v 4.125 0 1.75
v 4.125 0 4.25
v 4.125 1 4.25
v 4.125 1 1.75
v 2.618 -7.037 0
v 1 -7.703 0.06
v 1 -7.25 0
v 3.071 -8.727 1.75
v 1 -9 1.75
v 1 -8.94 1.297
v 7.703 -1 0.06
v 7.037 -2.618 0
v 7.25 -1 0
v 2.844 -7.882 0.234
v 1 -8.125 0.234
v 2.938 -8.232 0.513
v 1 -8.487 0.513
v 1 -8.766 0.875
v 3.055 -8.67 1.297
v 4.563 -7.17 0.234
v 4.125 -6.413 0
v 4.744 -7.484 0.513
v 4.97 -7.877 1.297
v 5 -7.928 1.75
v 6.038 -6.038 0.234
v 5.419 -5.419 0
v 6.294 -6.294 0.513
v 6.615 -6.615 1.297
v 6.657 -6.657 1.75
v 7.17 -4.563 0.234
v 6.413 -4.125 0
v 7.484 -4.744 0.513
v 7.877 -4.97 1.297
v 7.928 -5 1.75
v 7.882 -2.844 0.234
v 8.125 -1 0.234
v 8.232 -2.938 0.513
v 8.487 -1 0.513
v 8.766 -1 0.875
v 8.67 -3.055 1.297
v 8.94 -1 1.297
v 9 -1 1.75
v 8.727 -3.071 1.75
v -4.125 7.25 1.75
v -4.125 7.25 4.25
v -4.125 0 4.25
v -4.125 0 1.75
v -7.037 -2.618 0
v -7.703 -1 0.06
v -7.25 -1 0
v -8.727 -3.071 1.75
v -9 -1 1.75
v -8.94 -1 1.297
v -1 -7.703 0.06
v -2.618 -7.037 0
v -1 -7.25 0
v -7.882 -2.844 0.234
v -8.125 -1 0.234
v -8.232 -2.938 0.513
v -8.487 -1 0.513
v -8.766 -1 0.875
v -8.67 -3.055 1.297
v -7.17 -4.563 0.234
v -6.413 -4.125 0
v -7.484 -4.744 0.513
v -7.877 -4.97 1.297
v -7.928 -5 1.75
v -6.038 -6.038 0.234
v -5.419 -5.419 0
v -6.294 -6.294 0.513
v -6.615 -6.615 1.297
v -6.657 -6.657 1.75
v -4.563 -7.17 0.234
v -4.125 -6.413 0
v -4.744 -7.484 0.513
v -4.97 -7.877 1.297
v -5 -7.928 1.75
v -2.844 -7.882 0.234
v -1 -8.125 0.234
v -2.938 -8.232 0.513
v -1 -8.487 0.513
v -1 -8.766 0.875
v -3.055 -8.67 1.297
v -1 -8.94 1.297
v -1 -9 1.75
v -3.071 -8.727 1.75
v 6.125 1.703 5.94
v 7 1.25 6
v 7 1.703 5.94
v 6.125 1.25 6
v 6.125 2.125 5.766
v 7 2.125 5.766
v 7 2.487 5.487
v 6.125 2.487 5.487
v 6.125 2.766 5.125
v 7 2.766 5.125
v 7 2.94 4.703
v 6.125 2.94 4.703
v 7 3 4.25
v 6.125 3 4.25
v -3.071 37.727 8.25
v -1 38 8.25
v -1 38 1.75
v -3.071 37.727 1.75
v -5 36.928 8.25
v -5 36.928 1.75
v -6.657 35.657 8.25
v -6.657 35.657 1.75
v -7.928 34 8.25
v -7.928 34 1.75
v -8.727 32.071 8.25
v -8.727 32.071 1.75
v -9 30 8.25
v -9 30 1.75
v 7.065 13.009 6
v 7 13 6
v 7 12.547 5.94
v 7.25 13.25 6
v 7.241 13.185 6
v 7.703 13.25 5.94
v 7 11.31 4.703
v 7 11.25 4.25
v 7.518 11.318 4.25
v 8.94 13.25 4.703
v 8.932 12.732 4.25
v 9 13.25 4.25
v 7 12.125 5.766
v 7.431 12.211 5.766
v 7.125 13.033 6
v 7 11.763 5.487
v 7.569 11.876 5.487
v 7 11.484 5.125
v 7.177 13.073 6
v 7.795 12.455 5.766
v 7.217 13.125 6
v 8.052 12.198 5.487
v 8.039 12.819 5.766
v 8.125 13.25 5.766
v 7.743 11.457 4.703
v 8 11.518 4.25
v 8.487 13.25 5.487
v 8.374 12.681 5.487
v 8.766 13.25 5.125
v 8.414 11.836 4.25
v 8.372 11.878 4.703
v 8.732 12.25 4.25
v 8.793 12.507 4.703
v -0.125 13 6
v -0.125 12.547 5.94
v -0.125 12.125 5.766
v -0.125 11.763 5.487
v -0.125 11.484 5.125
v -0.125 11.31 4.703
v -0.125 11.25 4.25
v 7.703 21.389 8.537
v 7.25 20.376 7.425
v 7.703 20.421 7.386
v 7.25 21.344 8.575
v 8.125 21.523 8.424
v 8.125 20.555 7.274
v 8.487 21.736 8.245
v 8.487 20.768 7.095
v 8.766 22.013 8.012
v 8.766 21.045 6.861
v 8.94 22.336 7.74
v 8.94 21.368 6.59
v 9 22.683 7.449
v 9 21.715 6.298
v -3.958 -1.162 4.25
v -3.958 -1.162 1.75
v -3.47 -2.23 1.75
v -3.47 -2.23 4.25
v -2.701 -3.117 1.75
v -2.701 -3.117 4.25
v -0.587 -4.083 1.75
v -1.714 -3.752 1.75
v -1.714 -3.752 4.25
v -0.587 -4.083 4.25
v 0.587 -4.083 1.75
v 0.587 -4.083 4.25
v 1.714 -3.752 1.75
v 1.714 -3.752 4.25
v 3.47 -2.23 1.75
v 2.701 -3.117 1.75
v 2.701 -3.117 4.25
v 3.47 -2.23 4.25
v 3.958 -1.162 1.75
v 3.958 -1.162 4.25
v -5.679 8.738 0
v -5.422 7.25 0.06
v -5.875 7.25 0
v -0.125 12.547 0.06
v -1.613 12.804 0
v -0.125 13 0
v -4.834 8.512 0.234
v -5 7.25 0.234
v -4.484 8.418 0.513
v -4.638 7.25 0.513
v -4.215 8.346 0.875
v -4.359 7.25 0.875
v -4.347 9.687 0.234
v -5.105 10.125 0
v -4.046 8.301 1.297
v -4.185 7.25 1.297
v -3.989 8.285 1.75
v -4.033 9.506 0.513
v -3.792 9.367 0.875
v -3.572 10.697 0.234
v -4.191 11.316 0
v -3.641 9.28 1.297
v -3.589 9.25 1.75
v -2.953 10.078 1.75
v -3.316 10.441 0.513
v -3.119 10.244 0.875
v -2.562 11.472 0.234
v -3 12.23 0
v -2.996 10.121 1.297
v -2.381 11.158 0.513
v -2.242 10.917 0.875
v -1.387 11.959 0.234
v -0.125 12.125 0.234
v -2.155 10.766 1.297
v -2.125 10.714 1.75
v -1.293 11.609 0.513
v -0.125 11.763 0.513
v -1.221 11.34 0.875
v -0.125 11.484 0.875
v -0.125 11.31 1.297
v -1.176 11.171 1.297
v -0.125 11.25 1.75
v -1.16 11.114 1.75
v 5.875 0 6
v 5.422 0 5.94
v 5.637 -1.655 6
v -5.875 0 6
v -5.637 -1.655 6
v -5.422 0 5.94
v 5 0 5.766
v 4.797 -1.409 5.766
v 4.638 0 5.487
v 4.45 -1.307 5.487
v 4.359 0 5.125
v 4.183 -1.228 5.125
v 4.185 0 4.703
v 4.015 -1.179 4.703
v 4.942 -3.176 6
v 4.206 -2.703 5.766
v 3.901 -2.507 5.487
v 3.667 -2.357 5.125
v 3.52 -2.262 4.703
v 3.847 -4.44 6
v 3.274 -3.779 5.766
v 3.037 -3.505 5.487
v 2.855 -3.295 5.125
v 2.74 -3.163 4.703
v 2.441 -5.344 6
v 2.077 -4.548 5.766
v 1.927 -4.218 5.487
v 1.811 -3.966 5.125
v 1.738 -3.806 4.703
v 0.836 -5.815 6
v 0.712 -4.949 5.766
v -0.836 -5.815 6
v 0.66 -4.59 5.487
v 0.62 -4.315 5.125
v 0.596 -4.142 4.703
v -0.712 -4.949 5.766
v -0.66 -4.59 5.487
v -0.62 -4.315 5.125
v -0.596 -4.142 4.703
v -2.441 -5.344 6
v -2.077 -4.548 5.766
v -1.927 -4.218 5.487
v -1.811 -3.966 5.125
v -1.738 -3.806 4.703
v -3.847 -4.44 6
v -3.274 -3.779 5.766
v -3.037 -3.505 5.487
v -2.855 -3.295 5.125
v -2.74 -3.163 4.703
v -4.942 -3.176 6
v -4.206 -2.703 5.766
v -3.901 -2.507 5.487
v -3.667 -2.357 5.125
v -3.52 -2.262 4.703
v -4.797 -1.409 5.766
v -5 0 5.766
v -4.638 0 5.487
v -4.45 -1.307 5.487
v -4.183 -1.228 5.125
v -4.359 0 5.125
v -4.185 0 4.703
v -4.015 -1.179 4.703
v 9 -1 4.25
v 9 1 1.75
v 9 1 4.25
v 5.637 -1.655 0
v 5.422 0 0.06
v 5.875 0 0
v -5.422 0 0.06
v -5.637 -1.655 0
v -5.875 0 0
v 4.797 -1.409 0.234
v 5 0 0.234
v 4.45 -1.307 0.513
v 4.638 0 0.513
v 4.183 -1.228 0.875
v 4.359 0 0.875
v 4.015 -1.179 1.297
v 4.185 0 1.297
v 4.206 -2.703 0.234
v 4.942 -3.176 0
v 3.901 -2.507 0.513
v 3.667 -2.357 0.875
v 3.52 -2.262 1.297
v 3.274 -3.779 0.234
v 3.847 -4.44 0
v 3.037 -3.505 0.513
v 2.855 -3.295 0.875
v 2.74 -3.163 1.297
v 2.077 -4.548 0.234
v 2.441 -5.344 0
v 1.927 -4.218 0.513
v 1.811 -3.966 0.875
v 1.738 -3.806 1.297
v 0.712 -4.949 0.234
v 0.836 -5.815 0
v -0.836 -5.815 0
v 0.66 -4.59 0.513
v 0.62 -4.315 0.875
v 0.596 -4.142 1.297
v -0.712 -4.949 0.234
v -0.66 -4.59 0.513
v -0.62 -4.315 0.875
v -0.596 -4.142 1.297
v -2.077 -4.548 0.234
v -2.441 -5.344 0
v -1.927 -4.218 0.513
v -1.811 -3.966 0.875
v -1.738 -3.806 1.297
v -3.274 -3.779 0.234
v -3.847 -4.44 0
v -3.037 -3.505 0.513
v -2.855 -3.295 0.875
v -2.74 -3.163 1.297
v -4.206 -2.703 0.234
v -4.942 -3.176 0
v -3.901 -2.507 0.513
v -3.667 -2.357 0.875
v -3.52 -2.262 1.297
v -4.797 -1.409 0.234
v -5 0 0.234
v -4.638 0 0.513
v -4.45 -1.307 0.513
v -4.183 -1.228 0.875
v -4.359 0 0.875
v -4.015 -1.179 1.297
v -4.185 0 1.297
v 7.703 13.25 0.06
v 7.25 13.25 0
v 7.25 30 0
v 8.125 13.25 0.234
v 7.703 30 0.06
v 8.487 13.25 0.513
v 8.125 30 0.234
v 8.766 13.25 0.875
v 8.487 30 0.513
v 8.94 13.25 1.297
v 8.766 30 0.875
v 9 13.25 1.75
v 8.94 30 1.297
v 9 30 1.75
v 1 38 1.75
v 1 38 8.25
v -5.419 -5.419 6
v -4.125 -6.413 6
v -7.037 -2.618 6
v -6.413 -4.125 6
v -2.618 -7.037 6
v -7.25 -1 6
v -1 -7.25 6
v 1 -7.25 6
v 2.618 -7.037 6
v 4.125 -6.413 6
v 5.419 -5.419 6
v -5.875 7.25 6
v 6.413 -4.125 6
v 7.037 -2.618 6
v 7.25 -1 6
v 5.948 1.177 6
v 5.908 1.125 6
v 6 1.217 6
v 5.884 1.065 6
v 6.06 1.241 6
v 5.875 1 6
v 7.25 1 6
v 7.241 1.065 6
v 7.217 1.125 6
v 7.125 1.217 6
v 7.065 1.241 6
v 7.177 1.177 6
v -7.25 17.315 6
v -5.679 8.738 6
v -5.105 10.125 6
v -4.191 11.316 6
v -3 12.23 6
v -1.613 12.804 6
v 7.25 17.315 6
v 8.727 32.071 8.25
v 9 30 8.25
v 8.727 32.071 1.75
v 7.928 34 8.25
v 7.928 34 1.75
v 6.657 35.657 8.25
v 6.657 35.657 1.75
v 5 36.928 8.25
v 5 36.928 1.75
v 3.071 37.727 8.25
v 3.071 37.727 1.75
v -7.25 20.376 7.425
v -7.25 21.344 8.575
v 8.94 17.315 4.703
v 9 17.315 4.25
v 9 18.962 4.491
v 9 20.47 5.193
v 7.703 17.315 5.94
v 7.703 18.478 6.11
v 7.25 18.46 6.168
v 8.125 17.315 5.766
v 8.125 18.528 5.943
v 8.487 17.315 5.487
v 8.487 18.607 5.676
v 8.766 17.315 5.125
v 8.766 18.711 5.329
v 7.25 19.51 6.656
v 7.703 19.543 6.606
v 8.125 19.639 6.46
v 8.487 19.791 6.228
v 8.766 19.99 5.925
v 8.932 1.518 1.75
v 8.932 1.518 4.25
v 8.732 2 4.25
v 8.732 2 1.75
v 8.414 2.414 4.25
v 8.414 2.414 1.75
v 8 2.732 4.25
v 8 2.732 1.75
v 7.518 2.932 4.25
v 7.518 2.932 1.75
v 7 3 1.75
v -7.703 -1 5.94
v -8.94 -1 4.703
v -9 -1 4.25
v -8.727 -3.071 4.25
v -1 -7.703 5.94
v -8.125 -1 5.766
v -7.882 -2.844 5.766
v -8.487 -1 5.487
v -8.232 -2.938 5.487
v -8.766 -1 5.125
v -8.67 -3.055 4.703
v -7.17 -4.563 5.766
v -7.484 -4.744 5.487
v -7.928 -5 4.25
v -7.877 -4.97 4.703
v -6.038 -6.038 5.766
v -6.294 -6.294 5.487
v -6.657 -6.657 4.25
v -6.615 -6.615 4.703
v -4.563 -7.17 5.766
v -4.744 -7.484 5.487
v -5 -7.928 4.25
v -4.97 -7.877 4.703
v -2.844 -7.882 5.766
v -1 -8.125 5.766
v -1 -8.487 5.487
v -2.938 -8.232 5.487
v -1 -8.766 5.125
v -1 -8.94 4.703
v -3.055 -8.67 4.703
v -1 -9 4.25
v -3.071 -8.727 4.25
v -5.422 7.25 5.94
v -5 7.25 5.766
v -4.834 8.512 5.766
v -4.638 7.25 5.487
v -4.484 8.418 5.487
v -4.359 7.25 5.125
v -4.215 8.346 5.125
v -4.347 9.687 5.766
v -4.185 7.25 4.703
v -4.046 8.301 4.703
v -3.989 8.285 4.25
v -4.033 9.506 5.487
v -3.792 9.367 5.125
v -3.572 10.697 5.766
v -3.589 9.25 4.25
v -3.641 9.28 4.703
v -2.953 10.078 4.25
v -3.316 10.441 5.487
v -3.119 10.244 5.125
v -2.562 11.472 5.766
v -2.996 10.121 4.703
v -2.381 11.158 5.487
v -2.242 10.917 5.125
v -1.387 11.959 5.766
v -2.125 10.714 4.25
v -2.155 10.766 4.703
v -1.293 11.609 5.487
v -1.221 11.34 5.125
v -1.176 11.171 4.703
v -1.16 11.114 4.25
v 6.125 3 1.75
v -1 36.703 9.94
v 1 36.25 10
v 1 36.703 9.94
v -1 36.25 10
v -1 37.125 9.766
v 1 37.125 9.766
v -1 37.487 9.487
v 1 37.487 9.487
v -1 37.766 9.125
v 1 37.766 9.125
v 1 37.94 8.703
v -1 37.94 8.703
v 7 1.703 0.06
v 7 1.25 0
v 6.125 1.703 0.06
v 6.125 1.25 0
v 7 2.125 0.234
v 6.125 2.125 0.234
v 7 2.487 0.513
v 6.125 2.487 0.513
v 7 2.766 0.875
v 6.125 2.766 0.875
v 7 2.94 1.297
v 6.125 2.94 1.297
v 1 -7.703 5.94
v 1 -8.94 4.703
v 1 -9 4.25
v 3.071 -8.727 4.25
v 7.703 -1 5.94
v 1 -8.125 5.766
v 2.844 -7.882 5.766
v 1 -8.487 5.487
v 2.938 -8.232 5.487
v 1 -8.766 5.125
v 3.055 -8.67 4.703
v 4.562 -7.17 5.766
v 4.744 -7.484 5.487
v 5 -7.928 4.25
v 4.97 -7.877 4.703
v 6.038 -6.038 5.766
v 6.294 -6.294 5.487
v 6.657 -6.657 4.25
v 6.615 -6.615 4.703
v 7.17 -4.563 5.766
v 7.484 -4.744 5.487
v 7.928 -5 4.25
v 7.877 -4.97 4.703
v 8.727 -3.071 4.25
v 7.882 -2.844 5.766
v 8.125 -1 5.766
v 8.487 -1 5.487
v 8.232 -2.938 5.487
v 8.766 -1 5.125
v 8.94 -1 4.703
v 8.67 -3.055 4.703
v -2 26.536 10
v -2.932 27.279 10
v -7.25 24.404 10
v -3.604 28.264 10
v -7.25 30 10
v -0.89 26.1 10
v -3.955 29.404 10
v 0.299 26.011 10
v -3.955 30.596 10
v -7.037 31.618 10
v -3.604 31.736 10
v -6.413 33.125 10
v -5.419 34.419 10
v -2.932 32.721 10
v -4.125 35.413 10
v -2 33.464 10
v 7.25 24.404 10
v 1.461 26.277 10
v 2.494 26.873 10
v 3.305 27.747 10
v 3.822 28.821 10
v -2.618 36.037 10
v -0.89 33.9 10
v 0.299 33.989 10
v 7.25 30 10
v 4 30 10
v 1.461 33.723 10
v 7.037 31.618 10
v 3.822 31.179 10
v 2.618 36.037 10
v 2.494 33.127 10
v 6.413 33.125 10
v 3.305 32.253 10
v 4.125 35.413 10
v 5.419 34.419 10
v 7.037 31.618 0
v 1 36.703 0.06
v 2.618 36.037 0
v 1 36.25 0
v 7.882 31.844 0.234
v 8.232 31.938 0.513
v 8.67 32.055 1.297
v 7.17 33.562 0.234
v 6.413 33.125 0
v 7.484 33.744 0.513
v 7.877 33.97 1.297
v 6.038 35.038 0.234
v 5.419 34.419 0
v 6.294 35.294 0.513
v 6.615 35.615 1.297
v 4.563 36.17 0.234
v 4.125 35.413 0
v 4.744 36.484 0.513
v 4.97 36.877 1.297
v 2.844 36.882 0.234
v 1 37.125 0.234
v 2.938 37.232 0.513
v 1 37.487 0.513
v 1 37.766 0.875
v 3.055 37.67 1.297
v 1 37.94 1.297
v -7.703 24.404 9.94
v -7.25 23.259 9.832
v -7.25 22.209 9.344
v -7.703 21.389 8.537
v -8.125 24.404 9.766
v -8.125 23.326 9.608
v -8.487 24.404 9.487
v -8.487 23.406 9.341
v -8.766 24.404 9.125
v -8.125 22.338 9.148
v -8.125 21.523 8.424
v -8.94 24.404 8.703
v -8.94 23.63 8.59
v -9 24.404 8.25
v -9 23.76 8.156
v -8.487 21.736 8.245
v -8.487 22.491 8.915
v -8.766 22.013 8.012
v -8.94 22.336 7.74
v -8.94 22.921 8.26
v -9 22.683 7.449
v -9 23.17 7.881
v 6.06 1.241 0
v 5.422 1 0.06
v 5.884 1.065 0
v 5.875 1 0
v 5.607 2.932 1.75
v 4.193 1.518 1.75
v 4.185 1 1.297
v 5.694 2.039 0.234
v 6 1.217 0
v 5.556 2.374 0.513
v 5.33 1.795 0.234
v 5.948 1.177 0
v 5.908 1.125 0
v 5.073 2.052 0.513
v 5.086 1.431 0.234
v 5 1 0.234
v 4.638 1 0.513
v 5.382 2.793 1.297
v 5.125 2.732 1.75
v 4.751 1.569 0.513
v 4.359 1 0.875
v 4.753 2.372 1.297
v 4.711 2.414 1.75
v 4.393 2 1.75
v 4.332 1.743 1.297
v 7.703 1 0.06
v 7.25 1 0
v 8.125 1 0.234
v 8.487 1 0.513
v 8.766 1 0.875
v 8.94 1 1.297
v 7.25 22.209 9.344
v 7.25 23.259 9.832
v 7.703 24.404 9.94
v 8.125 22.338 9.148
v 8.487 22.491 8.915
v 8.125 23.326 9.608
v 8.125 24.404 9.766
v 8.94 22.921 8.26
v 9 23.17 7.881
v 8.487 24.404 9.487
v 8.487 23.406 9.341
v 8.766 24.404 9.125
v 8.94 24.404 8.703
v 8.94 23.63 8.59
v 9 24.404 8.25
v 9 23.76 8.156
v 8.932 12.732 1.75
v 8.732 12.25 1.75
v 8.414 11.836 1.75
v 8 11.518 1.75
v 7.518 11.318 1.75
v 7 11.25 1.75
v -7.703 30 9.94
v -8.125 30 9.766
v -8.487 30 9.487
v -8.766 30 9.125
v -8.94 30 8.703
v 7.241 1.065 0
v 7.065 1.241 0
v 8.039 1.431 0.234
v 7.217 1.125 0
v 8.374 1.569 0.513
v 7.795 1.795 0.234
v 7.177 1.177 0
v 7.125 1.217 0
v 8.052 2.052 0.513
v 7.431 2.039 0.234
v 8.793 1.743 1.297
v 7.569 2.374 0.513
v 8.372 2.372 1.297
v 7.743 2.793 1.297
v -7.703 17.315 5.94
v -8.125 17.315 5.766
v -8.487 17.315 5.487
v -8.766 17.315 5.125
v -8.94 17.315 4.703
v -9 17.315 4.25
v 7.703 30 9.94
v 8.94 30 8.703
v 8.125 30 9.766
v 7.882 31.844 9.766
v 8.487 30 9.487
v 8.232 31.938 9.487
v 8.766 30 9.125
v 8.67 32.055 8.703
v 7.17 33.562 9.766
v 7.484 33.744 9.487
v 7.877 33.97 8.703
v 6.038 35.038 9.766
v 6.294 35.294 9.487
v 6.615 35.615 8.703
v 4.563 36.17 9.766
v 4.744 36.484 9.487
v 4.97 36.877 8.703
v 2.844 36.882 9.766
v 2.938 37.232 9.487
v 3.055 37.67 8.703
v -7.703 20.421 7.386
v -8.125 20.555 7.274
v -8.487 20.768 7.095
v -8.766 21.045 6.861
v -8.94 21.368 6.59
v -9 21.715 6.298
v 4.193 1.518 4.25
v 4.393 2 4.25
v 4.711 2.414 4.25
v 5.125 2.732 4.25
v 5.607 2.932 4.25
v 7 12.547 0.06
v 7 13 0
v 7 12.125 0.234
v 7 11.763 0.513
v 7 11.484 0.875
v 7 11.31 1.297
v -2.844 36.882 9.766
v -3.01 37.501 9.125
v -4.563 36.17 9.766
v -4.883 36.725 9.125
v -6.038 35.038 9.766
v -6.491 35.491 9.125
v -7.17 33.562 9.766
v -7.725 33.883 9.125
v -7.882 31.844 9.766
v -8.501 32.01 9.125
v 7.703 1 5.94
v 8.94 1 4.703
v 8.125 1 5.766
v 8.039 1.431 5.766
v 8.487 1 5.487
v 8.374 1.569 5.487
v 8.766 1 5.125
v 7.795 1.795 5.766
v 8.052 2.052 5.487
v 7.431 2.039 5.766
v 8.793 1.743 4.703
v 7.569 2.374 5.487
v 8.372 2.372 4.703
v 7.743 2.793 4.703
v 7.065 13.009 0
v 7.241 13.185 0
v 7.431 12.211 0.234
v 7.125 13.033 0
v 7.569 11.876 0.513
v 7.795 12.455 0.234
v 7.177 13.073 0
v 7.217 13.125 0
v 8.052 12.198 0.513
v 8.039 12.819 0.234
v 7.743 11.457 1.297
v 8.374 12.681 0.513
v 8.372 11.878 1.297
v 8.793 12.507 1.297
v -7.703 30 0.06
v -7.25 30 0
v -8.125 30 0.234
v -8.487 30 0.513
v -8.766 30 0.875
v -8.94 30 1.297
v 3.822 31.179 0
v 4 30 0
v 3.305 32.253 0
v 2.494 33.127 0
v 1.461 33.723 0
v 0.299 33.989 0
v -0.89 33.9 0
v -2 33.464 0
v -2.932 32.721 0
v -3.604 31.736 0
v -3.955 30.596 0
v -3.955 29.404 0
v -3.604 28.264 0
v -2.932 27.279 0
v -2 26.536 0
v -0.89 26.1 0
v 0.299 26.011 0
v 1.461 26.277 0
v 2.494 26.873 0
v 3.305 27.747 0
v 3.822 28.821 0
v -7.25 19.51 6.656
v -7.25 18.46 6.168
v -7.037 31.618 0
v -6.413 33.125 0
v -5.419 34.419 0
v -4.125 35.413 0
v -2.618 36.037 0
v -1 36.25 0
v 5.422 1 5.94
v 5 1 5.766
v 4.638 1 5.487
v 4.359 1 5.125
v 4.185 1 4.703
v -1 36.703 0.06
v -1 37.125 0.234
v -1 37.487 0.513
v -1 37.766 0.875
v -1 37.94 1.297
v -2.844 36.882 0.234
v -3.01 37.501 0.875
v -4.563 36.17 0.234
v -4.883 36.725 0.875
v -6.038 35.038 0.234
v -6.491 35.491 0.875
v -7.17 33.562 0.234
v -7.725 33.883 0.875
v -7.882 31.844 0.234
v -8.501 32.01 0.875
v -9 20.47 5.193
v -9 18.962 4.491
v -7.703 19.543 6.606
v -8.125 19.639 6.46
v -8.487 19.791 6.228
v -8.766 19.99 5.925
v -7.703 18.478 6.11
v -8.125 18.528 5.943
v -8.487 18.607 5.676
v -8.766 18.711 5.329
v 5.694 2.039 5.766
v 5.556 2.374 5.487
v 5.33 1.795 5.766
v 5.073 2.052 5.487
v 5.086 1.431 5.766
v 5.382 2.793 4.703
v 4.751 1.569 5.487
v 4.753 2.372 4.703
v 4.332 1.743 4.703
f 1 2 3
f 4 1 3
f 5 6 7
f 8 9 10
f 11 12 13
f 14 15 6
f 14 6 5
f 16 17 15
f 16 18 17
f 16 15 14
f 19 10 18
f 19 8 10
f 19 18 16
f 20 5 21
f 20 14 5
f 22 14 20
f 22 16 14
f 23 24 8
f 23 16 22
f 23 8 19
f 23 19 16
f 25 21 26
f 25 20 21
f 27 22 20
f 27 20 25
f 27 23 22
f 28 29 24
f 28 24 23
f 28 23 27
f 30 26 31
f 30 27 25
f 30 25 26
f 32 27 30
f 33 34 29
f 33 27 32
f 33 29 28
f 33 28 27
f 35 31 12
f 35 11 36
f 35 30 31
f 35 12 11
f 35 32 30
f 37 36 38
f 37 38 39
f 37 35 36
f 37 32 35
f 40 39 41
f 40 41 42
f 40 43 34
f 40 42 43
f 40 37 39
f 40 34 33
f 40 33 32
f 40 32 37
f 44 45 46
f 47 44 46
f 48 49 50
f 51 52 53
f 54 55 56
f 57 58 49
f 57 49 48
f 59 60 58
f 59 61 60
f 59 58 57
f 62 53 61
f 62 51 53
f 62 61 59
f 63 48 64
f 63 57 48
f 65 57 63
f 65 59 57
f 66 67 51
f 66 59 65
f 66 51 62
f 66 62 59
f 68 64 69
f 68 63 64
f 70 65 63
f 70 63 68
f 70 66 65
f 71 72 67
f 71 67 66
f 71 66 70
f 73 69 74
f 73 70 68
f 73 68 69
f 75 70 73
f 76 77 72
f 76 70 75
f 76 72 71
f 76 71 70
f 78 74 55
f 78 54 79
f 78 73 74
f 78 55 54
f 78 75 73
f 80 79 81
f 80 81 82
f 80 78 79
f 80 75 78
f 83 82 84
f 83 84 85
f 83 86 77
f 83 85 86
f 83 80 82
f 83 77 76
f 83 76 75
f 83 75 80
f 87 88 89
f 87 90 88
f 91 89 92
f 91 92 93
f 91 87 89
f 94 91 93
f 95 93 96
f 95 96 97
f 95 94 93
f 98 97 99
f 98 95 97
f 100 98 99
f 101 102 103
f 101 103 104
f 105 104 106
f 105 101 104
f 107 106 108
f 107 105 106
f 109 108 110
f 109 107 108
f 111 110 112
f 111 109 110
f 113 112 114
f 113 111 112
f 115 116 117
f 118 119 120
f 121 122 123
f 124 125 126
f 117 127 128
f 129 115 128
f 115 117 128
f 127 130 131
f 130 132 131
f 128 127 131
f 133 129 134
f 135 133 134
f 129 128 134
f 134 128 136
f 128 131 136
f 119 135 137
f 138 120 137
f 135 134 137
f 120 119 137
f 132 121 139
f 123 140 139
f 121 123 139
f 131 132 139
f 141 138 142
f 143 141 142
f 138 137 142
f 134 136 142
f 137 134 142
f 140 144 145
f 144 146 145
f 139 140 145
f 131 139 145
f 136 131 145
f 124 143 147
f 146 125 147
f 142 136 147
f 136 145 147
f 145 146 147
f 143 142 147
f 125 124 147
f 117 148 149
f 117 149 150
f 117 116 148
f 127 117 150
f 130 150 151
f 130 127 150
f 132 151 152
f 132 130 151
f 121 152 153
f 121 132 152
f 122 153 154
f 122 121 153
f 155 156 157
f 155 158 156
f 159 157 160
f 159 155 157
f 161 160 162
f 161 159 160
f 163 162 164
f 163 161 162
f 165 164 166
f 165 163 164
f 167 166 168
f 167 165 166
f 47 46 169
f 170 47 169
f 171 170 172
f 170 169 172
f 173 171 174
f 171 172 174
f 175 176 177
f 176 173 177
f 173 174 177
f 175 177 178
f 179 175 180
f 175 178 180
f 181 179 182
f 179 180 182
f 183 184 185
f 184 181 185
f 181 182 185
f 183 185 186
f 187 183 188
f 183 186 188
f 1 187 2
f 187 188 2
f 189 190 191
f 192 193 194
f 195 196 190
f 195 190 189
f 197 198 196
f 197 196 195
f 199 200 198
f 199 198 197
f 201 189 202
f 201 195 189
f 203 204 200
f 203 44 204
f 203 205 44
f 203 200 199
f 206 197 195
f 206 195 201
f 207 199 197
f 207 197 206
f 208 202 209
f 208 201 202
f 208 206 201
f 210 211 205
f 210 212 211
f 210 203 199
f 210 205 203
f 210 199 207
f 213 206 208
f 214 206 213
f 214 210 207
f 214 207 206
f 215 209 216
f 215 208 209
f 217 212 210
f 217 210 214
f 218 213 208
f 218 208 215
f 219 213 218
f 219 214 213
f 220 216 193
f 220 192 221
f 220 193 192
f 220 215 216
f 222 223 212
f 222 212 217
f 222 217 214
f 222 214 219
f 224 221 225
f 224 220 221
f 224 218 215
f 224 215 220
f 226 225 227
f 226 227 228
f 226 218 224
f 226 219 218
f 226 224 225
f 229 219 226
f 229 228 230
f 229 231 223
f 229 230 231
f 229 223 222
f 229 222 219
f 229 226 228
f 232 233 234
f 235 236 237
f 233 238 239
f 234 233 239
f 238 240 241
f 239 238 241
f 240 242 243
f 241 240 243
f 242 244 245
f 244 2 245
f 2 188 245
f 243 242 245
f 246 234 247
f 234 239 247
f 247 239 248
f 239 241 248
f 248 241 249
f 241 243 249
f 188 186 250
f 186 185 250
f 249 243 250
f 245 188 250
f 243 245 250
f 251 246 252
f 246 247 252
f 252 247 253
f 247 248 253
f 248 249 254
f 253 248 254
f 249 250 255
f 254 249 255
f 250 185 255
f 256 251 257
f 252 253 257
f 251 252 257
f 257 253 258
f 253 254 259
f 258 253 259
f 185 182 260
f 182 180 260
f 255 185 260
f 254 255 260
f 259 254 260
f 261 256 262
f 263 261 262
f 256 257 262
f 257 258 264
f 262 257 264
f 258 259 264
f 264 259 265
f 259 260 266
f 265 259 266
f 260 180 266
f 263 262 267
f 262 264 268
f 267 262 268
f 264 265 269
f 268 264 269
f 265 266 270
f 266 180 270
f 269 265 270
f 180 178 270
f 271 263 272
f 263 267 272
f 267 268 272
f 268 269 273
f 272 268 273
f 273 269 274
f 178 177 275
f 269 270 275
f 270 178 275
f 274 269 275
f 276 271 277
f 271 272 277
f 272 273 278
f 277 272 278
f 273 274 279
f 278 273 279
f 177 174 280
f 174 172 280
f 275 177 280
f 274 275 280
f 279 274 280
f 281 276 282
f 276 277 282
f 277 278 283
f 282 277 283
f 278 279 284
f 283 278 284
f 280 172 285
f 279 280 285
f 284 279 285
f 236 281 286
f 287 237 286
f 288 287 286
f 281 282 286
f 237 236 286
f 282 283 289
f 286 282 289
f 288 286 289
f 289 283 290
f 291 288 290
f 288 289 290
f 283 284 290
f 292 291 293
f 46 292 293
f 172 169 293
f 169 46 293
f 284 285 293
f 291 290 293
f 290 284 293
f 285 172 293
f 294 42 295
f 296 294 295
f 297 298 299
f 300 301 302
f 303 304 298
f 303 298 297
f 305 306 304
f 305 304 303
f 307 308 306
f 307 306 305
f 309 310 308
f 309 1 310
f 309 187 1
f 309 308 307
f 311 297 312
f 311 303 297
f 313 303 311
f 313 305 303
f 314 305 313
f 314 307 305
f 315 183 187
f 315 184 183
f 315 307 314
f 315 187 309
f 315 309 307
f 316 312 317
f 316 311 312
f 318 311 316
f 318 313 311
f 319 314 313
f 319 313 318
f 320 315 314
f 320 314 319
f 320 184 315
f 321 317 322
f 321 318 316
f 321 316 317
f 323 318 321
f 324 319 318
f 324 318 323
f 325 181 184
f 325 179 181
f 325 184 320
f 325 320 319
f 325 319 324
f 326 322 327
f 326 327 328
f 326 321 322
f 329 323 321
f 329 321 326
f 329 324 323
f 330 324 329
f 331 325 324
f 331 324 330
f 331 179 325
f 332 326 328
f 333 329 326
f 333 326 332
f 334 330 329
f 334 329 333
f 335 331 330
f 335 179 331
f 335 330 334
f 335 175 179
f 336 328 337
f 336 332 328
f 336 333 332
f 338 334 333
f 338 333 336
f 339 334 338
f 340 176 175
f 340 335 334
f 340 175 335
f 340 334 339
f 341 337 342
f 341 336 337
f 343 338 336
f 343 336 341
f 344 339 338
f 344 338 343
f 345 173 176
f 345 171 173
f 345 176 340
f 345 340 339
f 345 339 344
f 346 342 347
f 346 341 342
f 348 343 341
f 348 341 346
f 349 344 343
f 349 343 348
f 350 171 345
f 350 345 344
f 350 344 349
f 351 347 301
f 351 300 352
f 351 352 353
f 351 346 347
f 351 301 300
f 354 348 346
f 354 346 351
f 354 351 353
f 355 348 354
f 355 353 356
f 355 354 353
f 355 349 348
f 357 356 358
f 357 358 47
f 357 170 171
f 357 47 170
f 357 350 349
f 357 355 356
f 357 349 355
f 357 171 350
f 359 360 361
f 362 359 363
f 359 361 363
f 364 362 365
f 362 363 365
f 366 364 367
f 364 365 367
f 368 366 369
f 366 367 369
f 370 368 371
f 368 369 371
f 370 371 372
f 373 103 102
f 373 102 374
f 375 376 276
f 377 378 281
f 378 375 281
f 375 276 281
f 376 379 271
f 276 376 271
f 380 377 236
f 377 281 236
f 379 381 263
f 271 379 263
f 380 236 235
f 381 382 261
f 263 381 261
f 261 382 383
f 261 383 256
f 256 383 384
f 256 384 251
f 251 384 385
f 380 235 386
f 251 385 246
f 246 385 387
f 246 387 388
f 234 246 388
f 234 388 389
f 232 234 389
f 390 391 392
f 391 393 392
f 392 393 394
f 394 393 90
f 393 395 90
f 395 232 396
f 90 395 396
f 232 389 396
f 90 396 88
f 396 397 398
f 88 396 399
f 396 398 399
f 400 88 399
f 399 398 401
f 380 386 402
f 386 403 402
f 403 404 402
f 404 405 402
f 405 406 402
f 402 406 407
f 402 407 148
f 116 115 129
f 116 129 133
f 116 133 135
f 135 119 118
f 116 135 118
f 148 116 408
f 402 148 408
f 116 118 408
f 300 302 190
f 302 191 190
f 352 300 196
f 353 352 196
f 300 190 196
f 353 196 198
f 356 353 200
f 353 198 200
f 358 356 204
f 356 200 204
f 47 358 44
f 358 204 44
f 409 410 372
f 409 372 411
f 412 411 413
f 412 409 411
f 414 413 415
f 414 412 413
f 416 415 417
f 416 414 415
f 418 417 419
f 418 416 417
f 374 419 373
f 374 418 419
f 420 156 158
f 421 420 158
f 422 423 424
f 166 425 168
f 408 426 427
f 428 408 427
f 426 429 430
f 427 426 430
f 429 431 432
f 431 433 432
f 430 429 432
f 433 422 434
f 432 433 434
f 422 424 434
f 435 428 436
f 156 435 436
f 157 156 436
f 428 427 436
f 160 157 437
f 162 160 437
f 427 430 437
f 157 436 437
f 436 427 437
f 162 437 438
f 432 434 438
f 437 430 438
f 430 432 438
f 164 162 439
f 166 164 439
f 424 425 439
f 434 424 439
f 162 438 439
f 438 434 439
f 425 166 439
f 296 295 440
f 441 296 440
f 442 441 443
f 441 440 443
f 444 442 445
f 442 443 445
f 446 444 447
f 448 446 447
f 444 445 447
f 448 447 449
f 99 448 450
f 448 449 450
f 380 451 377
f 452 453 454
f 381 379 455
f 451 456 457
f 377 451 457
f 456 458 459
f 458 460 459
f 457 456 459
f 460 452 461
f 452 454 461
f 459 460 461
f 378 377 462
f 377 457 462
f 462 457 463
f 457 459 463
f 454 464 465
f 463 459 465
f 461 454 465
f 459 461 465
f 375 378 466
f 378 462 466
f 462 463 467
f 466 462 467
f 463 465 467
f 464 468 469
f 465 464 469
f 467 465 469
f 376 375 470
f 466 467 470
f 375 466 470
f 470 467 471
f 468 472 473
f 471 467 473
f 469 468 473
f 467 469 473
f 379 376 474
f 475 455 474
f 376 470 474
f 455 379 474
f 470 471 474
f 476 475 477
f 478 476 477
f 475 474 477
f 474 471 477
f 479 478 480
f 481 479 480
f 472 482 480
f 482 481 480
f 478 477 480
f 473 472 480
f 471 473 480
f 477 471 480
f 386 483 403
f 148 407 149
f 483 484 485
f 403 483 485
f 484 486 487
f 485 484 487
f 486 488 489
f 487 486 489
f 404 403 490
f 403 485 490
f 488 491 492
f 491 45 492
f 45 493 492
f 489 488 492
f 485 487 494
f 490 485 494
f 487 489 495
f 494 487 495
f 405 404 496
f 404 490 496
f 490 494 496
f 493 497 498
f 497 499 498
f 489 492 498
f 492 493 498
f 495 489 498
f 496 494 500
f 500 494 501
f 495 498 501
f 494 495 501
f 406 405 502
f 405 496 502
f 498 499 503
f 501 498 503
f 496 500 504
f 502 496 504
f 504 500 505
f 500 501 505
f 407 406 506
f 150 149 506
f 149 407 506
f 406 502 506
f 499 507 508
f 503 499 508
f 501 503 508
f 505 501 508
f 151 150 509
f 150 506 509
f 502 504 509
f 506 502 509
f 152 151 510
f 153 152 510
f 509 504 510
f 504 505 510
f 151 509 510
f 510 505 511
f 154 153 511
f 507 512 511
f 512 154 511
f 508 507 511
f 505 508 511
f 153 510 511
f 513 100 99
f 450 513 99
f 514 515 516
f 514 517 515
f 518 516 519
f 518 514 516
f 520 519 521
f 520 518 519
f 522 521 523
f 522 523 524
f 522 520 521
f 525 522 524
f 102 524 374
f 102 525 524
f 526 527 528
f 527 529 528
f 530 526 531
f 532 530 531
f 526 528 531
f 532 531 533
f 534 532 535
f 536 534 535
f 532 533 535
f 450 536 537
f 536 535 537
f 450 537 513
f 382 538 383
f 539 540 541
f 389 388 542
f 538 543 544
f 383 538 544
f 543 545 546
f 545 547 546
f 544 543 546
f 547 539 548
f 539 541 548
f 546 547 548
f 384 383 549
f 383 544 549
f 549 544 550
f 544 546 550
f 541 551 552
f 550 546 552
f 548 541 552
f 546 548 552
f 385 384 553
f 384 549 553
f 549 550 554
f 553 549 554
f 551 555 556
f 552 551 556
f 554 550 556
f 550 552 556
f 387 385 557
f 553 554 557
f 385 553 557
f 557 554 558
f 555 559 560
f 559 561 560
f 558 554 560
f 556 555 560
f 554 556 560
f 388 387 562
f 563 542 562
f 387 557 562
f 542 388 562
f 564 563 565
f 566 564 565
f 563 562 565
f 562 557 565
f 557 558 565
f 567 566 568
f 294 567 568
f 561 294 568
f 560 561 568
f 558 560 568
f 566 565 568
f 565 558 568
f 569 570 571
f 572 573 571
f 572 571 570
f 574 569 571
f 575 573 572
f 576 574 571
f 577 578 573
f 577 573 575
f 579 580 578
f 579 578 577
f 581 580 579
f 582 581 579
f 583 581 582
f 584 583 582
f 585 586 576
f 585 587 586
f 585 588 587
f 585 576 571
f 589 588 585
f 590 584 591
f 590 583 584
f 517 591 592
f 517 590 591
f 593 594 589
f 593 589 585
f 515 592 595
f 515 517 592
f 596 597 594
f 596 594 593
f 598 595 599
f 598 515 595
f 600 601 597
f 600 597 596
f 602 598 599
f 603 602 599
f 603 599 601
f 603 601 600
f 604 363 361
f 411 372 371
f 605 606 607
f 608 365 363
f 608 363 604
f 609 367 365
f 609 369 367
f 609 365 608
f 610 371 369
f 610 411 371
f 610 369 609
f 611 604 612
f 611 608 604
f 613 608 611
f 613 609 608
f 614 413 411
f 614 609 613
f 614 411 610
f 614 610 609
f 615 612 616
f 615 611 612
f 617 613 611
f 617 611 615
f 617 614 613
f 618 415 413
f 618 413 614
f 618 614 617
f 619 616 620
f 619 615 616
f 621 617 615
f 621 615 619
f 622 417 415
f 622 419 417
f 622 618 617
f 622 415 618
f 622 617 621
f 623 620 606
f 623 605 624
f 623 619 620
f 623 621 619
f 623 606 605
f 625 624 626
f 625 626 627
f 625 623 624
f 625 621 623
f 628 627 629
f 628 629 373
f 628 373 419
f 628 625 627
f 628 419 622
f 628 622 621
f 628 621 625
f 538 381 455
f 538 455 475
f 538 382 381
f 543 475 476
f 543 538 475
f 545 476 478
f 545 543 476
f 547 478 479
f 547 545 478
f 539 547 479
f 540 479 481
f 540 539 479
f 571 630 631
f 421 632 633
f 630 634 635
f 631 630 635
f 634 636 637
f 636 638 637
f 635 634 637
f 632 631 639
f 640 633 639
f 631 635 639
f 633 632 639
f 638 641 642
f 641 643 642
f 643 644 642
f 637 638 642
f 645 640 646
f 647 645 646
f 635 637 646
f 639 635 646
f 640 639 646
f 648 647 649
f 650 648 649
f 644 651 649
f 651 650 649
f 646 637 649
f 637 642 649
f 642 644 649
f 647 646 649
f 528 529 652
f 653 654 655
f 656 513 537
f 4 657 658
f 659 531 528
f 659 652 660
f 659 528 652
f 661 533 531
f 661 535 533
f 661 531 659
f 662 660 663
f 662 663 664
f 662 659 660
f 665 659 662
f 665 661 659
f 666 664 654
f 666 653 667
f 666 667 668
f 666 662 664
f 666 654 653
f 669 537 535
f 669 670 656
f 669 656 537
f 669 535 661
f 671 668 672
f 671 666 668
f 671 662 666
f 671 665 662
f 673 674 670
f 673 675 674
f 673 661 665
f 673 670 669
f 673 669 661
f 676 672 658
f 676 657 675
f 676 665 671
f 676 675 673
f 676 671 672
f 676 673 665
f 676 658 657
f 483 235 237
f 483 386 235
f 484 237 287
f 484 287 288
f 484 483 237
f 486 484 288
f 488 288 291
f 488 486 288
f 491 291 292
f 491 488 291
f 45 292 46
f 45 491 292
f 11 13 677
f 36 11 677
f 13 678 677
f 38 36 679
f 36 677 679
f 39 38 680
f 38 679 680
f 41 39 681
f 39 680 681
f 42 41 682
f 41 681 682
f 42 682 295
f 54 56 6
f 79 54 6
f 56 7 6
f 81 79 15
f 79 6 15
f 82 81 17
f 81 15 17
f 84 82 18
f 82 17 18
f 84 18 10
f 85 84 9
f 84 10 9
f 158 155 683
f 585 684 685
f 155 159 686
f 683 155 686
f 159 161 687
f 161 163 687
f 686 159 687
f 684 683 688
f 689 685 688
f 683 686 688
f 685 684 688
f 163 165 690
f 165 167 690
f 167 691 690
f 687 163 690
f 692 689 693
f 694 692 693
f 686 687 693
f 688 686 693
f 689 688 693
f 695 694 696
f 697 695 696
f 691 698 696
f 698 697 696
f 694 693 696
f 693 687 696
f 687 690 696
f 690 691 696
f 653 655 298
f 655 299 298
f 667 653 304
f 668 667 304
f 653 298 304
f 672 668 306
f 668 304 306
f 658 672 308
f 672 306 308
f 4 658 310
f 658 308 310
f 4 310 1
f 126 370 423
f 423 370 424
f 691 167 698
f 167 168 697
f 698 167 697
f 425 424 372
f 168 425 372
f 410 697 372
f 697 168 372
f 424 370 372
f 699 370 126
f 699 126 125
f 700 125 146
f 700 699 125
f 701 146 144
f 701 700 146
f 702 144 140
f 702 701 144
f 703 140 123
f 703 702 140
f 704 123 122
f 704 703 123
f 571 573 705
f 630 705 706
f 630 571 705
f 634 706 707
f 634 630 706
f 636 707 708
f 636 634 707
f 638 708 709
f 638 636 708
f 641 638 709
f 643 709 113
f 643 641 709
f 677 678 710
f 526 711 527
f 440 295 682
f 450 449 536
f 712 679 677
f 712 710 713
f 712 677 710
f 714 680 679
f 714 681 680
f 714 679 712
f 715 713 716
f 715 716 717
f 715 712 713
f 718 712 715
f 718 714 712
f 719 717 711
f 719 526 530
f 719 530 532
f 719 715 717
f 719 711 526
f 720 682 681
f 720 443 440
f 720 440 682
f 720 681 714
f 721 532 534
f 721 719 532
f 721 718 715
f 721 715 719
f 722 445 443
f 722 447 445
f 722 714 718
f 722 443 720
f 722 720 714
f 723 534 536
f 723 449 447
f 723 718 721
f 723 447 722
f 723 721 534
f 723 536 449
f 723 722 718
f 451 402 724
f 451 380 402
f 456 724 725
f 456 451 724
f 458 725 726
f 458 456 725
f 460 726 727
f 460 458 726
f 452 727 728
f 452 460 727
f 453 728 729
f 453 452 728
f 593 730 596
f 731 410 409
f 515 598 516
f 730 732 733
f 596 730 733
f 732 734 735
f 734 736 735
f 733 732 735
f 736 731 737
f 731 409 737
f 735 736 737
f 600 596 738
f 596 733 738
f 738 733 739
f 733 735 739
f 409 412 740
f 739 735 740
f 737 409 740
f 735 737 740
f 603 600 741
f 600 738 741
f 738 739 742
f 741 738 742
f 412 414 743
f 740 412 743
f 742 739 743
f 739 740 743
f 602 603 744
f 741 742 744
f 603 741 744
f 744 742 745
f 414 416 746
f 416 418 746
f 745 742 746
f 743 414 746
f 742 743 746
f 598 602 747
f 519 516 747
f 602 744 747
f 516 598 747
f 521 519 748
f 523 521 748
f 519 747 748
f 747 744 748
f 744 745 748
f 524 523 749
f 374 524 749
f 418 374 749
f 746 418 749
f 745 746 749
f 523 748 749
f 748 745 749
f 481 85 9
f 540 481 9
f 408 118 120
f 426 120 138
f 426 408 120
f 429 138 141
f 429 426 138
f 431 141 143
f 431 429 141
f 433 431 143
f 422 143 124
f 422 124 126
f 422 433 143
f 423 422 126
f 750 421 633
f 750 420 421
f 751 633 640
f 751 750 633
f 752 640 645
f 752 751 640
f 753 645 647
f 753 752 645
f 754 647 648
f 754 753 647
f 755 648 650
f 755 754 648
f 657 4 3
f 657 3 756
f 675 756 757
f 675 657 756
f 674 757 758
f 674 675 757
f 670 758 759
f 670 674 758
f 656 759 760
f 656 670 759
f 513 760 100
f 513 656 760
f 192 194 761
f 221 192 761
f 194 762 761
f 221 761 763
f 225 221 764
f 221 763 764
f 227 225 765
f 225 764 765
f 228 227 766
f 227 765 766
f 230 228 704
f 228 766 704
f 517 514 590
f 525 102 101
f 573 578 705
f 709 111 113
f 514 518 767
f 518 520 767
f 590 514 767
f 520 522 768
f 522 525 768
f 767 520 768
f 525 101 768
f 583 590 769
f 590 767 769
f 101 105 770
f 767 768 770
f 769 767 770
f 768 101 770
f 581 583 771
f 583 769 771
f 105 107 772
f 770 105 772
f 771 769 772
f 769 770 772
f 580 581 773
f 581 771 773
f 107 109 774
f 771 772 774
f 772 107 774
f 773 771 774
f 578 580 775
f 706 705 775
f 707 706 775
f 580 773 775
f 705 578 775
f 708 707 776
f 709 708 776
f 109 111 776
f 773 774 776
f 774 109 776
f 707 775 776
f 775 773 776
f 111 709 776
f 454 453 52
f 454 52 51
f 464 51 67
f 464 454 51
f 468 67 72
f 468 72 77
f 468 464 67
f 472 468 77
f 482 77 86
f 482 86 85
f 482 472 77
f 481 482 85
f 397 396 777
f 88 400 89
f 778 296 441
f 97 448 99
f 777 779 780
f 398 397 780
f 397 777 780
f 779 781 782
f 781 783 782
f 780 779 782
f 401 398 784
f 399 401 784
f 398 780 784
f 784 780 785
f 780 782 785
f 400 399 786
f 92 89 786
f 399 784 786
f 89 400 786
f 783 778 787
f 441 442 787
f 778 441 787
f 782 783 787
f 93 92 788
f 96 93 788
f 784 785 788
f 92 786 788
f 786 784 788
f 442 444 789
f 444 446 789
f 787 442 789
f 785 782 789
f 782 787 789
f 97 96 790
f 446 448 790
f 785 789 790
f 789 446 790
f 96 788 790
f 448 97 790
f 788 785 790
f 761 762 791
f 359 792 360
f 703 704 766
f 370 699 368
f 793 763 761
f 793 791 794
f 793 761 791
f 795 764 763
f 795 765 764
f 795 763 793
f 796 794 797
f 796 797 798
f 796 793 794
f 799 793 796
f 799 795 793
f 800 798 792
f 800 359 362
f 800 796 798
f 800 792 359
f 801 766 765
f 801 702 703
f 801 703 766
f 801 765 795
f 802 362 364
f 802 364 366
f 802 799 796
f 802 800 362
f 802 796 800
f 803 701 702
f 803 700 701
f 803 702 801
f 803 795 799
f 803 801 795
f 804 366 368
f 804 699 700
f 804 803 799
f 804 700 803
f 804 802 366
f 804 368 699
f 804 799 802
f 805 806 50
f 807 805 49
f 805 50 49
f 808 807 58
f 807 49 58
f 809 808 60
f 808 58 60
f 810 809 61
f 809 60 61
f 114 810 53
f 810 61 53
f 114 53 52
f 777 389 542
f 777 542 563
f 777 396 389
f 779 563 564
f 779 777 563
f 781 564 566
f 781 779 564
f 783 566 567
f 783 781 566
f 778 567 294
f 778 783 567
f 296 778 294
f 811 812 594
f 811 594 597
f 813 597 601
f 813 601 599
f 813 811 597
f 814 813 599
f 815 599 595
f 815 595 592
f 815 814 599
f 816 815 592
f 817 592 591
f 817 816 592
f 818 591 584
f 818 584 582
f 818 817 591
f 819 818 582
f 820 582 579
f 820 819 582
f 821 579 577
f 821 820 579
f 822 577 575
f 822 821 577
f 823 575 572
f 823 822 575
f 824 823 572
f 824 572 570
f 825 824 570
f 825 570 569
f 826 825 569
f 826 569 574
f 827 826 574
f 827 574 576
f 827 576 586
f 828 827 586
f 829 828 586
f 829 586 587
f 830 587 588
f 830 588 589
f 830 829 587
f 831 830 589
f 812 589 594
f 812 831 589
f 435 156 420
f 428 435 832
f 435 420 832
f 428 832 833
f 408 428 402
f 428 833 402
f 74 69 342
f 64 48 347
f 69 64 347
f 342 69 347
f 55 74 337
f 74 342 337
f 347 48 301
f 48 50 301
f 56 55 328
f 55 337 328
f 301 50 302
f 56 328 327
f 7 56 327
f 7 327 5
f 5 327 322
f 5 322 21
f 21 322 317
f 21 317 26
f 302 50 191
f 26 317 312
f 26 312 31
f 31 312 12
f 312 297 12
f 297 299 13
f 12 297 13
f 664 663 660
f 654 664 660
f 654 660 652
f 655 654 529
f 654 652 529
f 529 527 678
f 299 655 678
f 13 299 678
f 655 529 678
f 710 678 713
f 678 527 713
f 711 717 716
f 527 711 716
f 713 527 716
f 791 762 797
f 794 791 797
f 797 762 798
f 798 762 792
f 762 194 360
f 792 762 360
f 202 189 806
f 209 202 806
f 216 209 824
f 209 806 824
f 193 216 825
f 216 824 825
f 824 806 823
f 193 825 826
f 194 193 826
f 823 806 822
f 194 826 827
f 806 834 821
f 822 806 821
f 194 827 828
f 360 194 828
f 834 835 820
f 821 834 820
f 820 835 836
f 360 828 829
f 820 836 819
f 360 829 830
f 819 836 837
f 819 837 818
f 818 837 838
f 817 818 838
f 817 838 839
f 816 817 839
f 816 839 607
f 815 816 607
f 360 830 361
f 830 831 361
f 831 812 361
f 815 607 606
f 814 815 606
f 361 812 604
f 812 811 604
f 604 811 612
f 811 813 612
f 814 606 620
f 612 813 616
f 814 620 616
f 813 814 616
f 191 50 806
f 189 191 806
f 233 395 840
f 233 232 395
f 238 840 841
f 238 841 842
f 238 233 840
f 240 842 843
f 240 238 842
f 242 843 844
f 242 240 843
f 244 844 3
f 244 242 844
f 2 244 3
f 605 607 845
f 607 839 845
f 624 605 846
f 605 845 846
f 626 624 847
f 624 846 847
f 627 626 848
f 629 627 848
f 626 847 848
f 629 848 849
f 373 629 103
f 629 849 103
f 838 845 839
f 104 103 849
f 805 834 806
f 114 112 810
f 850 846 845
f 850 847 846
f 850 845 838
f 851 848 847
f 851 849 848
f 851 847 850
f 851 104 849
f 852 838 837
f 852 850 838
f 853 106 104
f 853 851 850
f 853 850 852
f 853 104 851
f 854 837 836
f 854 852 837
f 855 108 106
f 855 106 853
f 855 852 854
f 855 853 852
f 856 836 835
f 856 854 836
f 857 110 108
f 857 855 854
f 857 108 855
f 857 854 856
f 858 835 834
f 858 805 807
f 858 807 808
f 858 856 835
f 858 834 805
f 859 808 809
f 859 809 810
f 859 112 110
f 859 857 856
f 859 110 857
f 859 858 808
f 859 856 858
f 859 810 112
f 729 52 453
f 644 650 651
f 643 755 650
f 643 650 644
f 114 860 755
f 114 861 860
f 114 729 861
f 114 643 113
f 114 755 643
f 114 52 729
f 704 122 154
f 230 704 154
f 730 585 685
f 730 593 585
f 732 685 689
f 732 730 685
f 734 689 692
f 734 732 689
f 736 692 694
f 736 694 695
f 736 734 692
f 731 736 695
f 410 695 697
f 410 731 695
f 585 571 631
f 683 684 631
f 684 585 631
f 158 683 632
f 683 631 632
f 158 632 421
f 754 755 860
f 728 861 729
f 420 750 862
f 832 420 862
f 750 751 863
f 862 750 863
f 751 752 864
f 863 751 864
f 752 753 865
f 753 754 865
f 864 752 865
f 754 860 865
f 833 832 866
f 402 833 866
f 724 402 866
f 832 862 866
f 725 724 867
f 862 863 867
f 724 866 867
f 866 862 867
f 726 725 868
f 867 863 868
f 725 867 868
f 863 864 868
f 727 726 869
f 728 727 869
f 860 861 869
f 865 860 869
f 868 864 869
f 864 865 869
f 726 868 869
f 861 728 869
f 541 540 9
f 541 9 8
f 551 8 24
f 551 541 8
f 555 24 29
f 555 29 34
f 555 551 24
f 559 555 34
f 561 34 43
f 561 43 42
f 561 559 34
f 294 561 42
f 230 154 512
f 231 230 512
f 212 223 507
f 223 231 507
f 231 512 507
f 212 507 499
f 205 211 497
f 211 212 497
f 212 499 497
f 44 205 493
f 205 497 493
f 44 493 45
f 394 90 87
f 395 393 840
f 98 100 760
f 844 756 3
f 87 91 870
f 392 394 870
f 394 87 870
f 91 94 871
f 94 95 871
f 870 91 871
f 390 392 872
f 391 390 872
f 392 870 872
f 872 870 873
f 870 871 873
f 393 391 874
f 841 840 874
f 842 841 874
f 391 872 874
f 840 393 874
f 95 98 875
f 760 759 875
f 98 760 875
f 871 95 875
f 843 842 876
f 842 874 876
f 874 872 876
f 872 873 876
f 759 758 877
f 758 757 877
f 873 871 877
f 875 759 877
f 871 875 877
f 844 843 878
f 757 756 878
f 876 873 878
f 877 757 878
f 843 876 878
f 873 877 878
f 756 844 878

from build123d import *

# Parameters (mm, degrees)
F0_W     = 18
F0_H     = 47
F0_R     = 4
F1_DEPTH = 10
F3_DEPTH = 10
F4_R     = 2
F5_R     = 8
F8_DEPTH = 40.101
F9_R     = 4
F10_R    = 1.75


with BuildPart() as f1:
    # F0 (on Top) → F1 (new body)
    with BuildSketch(Plane.XY):
        with Locations((0, 14.5)):
            Rectangle(F0_W, F0_H)
        with Locations((0, 30)):
            Circle(F0_R, mode=Mode.SUBTRACT)
    extrude(amount=F1_DEPTH)

    # F2 (on face) → F3 (cut, through all)
    with BuildSketch(Plane.XY.offset(10)):
        with BuildLine():
            Line((-4.125, 7.25), (-4.125, 0))
            ThreePointArc((-4.125, 0), (0, -4.125), (4.125, 0))
            Line((4.125, 0), (4.125, 3))
            Line((4.125, 3), (9, 3))
            Line((9, 3), (9, 11.25))
            Line((9, 11.25), (-0.125, 11.25))
            ThreePointArc((-0.125, 11.25), (-2.9534271247, 10.0784271247), (-4.125, 7.25))
        make_face()
    extrude(amount=-F3_DEPTH, mode=Mode.SUBTRACT)

    # F4
    f4_edges = [f1.edges().sort_by_distance(p)[0] for p in [
        (9, 11.25, 5),
        (4.125, 3, 5),
        (9, 3, 5),
    ]]
    fillet(f4_edges, radius=F4_R)

    # F5
    f5_edges = [f1.edges().sort_by_distance(p)[0] for p in [
        (-9, 38, 5),
        (9, 38, 5),
        (9, -9, 5),
        (-9, -9, 5),
    ]]
    fillet(f5_edges, radius=F5_R)

    # F7 (on offset) → F8 (cut, through all)
    with BuildSketch(Plane.YZ.offset(31.1)):
        Polygon((-19.3344665721, 16.6492760181), (-18.773978632, 6), (19.1768726818, 6), (28.1374584883, 16.6492760181), align=None)
    extrude(amount=-F8_DEPTH, mode=Mode.SUBTRACT)

    # F9
    f9_edges = [f1.edges().sort_by_distance(p)[0] for p in [
        (0, 22.54258, 10),
        (0, 19.176873, 6),
    ]]
    fillet(f9_edges, radius=F9_R)

    # F10
    f10_edges = [f1.edges().sort_by_distance(p)[0] for p in [
        (-6.656854, 35.656854, 10),
        (6.656854, 35.656854, 10),
        (-6.656854, 35.656854, 0),
        (6.656854, 35.656854, 0),
    ]]
    fillet(f10_edges, radius=F10_R)


solid = f1.part
